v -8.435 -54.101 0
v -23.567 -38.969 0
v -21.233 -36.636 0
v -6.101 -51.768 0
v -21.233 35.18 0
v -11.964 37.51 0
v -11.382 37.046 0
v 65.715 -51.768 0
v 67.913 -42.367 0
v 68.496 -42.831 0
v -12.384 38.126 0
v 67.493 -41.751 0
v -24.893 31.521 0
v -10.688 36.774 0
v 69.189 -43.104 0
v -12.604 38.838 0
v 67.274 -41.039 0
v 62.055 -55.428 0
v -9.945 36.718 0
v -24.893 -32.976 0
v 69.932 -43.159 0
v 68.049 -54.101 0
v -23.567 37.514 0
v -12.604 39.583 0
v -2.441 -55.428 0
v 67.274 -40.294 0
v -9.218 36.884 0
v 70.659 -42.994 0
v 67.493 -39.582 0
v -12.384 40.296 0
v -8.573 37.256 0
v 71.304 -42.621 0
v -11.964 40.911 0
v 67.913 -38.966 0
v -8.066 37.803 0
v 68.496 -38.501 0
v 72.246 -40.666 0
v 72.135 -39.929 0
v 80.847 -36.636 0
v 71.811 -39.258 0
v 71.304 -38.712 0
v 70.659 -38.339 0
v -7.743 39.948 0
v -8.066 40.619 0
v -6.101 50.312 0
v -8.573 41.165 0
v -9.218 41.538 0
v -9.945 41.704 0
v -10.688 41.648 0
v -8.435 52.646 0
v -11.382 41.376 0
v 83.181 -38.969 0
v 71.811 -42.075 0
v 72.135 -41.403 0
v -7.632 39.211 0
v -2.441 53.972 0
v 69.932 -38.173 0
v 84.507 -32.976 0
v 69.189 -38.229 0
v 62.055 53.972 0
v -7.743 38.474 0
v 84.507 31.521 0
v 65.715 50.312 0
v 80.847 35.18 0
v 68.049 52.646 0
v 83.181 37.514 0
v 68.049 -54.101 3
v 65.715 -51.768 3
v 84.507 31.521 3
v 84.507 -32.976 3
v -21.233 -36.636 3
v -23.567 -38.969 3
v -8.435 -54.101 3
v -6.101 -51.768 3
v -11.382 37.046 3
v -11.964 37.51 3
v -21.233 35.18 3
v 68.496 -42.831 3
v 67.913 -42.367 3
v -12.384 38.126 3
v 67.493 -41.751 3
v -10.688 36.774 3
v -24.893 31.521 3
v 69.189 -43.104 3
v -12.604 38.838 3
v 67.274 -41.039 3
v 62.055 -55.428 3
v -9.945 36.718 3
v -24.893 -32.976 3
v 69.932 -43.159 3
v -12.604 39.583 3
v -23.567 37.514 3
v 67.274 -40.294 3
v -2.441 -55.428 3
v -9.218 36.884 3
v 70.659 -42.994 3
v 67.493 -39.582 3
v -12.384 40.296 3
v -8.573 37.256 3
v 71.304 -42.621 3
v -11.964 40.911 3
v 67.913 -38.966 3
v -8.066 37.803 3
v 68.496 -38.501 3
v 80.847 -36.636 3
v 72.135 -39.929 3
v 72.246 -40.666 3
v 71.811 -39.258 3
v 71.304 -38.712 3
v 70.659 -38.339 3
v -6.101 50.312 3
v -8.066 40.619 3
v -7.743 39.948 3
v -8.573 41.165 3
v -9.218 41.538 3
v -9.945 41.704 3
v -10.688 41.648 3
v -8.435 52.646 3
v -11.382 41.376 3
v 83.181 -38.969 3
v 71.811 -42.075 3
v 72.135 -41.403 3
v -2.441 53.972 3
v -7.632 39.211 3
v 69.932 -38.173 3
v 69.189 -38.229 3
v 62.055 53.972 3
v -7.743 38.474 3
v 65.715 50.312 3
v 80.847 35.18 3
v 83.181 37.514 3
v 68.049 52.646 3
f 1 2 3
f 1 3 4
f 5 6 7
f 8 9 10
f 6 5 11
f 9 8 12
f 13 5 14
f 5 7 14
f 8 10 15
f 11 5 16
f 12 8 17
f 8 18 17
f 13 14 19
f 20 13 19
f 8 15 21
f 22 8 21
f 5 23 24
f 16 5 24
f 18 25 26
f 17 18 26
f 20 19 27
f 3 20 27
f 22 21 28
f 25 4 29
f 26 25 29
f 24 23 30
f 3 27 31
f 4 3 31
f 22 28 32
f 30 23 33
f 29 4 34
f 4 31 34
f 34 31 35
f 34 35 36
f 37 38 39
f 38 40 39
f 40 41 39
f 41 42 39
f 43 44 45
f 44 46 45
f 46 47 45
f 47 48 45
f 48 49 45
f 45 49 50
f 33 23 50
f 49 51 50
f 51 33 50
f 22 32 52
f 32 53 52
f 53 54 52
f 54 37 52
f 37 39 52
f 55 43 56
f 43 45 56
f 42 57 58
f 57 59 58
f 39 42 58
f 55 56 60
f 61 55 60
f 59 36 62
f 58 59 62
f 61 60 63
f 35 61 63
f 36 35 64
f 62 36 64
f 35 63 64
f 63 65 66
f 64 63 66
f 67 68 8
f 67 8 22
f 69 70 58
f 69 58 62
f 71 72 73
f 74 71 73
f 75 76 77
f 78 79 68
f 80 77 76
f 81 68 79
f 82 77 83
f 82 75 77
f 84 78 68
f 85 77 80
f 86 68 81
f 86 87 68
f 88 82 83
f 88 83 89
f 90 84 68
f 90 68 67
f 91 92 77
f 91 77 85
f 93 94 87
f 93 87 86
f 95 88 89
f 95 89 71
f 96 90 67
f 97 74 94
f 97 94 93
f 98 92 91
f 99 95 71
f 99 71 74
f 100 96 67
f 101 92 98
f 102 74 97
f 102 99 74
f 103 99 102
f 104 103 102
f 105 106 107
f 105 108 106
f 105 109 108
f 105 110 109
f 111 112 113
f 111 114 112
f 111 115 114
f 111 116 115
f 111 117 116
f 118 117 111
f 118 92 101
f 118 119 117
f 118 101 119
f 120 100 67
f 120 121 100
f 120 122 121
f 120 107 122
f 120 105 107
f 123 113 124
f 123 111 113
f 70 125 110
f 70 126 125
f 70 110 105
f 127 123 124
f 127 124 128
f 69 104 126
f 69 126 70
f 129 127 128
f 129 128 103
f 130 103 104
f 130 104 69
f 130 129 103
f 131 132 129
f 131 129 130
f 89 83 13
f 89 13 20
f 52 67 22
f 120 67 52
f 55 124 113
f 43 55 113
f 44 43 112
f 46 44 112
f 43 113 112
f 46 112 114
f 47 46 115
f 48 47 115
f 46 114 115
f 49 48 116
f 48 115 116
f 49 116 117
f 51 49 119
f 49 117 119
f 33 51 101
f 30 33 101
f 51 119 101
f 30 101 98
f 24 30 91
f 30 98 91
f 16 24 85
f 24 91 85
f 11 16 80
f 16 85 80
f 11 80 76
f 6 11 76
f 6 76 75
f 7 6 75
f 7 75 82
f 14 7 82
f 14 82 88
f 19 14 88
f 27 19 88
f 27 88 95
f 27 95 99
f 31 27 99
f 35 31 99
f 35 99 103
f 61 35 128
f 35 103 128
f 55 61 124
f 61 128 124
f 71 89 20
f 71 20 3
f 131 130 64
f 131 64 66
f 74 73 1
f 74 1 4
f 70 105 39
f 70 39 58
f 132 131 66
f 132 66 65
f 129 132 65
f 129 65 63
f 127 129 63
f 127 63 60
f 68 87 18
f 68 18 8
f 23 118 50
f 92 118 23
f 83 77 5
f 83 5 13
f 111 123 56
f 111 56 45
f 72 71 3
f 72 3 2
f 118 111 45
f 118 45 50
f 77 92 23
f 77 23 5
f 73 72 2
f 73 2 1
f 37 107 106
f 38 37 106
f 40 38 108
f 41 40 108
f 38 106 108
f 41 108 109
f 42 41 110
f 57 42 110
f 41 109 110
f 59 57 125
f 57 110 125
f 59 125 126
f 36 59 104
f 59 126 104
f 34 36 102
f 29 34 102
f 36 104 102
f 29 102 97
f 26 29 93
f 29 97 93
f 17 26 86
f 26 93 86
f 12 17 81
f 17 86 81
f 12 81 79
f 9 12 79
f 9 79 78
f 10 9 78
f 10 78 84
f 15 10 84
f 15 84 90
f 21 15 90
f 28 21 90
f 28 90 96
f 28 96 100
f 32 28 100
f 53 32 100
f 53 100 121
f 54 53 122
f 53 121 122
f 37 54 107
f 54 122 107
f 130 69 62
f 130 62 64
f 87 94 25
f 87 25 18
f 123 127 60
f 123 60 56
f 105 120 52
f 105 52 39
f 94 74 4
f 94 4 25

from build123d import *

# Parameters (mm, degrees)
ESQUISSE1_R        = 2.5
BOSS_EXTRU_1_DEPTH = 3


with BuildPart() as part:
    # Esquisse1 → Boss.-Extru.1 (new body)
    with BuildSketch(Plane.XY.offset(3)):
        Polygon((83.180673727, 37.513816477), (68.04858861, 52.645901594), (65.715136232, 50.312449216), (62.055338257, 53.972247191), (-2.441299609, 53.972247191), (-6.101097584, 50.312449216), (-8.434549962, 52.645901594), (-23.566635079, 37.513816477), (-21.233182701, 35.180364099), (-24.892980676, 31.520566124), (-24.892980676, -32.976071742), (-21.233182701, -36.635869717), (-23.566635079, -38.969322095), (-8.434549962, -54.101407212), (-6.101097584, -51.767954834), (-2.441299609, -55.427752809), (62.055338257, -55.427752809), (65.715136232, -51.767954834), (68.04858861, -54.101407212), (83.180673727, -38.969322095), (80.847221349, -36.635869717), (84.507019324, -32.976071742), (84.507019324, 31.520566124), (80.847221349, 35.180364099), align=None)
        with Locations((-10.131606237, 39.210872752)):
            Circle(ESQUISSE1_R, mode=Mode.SUBTRACT)
        with Locations((69.745644885, -40.66637837)):
            Circle(ESQUISSE1_R, mode=Mode.SUBTRACT)
    extrude(amount=-BOSS_EXTRU_1_DEPTH)


solid = part.part
